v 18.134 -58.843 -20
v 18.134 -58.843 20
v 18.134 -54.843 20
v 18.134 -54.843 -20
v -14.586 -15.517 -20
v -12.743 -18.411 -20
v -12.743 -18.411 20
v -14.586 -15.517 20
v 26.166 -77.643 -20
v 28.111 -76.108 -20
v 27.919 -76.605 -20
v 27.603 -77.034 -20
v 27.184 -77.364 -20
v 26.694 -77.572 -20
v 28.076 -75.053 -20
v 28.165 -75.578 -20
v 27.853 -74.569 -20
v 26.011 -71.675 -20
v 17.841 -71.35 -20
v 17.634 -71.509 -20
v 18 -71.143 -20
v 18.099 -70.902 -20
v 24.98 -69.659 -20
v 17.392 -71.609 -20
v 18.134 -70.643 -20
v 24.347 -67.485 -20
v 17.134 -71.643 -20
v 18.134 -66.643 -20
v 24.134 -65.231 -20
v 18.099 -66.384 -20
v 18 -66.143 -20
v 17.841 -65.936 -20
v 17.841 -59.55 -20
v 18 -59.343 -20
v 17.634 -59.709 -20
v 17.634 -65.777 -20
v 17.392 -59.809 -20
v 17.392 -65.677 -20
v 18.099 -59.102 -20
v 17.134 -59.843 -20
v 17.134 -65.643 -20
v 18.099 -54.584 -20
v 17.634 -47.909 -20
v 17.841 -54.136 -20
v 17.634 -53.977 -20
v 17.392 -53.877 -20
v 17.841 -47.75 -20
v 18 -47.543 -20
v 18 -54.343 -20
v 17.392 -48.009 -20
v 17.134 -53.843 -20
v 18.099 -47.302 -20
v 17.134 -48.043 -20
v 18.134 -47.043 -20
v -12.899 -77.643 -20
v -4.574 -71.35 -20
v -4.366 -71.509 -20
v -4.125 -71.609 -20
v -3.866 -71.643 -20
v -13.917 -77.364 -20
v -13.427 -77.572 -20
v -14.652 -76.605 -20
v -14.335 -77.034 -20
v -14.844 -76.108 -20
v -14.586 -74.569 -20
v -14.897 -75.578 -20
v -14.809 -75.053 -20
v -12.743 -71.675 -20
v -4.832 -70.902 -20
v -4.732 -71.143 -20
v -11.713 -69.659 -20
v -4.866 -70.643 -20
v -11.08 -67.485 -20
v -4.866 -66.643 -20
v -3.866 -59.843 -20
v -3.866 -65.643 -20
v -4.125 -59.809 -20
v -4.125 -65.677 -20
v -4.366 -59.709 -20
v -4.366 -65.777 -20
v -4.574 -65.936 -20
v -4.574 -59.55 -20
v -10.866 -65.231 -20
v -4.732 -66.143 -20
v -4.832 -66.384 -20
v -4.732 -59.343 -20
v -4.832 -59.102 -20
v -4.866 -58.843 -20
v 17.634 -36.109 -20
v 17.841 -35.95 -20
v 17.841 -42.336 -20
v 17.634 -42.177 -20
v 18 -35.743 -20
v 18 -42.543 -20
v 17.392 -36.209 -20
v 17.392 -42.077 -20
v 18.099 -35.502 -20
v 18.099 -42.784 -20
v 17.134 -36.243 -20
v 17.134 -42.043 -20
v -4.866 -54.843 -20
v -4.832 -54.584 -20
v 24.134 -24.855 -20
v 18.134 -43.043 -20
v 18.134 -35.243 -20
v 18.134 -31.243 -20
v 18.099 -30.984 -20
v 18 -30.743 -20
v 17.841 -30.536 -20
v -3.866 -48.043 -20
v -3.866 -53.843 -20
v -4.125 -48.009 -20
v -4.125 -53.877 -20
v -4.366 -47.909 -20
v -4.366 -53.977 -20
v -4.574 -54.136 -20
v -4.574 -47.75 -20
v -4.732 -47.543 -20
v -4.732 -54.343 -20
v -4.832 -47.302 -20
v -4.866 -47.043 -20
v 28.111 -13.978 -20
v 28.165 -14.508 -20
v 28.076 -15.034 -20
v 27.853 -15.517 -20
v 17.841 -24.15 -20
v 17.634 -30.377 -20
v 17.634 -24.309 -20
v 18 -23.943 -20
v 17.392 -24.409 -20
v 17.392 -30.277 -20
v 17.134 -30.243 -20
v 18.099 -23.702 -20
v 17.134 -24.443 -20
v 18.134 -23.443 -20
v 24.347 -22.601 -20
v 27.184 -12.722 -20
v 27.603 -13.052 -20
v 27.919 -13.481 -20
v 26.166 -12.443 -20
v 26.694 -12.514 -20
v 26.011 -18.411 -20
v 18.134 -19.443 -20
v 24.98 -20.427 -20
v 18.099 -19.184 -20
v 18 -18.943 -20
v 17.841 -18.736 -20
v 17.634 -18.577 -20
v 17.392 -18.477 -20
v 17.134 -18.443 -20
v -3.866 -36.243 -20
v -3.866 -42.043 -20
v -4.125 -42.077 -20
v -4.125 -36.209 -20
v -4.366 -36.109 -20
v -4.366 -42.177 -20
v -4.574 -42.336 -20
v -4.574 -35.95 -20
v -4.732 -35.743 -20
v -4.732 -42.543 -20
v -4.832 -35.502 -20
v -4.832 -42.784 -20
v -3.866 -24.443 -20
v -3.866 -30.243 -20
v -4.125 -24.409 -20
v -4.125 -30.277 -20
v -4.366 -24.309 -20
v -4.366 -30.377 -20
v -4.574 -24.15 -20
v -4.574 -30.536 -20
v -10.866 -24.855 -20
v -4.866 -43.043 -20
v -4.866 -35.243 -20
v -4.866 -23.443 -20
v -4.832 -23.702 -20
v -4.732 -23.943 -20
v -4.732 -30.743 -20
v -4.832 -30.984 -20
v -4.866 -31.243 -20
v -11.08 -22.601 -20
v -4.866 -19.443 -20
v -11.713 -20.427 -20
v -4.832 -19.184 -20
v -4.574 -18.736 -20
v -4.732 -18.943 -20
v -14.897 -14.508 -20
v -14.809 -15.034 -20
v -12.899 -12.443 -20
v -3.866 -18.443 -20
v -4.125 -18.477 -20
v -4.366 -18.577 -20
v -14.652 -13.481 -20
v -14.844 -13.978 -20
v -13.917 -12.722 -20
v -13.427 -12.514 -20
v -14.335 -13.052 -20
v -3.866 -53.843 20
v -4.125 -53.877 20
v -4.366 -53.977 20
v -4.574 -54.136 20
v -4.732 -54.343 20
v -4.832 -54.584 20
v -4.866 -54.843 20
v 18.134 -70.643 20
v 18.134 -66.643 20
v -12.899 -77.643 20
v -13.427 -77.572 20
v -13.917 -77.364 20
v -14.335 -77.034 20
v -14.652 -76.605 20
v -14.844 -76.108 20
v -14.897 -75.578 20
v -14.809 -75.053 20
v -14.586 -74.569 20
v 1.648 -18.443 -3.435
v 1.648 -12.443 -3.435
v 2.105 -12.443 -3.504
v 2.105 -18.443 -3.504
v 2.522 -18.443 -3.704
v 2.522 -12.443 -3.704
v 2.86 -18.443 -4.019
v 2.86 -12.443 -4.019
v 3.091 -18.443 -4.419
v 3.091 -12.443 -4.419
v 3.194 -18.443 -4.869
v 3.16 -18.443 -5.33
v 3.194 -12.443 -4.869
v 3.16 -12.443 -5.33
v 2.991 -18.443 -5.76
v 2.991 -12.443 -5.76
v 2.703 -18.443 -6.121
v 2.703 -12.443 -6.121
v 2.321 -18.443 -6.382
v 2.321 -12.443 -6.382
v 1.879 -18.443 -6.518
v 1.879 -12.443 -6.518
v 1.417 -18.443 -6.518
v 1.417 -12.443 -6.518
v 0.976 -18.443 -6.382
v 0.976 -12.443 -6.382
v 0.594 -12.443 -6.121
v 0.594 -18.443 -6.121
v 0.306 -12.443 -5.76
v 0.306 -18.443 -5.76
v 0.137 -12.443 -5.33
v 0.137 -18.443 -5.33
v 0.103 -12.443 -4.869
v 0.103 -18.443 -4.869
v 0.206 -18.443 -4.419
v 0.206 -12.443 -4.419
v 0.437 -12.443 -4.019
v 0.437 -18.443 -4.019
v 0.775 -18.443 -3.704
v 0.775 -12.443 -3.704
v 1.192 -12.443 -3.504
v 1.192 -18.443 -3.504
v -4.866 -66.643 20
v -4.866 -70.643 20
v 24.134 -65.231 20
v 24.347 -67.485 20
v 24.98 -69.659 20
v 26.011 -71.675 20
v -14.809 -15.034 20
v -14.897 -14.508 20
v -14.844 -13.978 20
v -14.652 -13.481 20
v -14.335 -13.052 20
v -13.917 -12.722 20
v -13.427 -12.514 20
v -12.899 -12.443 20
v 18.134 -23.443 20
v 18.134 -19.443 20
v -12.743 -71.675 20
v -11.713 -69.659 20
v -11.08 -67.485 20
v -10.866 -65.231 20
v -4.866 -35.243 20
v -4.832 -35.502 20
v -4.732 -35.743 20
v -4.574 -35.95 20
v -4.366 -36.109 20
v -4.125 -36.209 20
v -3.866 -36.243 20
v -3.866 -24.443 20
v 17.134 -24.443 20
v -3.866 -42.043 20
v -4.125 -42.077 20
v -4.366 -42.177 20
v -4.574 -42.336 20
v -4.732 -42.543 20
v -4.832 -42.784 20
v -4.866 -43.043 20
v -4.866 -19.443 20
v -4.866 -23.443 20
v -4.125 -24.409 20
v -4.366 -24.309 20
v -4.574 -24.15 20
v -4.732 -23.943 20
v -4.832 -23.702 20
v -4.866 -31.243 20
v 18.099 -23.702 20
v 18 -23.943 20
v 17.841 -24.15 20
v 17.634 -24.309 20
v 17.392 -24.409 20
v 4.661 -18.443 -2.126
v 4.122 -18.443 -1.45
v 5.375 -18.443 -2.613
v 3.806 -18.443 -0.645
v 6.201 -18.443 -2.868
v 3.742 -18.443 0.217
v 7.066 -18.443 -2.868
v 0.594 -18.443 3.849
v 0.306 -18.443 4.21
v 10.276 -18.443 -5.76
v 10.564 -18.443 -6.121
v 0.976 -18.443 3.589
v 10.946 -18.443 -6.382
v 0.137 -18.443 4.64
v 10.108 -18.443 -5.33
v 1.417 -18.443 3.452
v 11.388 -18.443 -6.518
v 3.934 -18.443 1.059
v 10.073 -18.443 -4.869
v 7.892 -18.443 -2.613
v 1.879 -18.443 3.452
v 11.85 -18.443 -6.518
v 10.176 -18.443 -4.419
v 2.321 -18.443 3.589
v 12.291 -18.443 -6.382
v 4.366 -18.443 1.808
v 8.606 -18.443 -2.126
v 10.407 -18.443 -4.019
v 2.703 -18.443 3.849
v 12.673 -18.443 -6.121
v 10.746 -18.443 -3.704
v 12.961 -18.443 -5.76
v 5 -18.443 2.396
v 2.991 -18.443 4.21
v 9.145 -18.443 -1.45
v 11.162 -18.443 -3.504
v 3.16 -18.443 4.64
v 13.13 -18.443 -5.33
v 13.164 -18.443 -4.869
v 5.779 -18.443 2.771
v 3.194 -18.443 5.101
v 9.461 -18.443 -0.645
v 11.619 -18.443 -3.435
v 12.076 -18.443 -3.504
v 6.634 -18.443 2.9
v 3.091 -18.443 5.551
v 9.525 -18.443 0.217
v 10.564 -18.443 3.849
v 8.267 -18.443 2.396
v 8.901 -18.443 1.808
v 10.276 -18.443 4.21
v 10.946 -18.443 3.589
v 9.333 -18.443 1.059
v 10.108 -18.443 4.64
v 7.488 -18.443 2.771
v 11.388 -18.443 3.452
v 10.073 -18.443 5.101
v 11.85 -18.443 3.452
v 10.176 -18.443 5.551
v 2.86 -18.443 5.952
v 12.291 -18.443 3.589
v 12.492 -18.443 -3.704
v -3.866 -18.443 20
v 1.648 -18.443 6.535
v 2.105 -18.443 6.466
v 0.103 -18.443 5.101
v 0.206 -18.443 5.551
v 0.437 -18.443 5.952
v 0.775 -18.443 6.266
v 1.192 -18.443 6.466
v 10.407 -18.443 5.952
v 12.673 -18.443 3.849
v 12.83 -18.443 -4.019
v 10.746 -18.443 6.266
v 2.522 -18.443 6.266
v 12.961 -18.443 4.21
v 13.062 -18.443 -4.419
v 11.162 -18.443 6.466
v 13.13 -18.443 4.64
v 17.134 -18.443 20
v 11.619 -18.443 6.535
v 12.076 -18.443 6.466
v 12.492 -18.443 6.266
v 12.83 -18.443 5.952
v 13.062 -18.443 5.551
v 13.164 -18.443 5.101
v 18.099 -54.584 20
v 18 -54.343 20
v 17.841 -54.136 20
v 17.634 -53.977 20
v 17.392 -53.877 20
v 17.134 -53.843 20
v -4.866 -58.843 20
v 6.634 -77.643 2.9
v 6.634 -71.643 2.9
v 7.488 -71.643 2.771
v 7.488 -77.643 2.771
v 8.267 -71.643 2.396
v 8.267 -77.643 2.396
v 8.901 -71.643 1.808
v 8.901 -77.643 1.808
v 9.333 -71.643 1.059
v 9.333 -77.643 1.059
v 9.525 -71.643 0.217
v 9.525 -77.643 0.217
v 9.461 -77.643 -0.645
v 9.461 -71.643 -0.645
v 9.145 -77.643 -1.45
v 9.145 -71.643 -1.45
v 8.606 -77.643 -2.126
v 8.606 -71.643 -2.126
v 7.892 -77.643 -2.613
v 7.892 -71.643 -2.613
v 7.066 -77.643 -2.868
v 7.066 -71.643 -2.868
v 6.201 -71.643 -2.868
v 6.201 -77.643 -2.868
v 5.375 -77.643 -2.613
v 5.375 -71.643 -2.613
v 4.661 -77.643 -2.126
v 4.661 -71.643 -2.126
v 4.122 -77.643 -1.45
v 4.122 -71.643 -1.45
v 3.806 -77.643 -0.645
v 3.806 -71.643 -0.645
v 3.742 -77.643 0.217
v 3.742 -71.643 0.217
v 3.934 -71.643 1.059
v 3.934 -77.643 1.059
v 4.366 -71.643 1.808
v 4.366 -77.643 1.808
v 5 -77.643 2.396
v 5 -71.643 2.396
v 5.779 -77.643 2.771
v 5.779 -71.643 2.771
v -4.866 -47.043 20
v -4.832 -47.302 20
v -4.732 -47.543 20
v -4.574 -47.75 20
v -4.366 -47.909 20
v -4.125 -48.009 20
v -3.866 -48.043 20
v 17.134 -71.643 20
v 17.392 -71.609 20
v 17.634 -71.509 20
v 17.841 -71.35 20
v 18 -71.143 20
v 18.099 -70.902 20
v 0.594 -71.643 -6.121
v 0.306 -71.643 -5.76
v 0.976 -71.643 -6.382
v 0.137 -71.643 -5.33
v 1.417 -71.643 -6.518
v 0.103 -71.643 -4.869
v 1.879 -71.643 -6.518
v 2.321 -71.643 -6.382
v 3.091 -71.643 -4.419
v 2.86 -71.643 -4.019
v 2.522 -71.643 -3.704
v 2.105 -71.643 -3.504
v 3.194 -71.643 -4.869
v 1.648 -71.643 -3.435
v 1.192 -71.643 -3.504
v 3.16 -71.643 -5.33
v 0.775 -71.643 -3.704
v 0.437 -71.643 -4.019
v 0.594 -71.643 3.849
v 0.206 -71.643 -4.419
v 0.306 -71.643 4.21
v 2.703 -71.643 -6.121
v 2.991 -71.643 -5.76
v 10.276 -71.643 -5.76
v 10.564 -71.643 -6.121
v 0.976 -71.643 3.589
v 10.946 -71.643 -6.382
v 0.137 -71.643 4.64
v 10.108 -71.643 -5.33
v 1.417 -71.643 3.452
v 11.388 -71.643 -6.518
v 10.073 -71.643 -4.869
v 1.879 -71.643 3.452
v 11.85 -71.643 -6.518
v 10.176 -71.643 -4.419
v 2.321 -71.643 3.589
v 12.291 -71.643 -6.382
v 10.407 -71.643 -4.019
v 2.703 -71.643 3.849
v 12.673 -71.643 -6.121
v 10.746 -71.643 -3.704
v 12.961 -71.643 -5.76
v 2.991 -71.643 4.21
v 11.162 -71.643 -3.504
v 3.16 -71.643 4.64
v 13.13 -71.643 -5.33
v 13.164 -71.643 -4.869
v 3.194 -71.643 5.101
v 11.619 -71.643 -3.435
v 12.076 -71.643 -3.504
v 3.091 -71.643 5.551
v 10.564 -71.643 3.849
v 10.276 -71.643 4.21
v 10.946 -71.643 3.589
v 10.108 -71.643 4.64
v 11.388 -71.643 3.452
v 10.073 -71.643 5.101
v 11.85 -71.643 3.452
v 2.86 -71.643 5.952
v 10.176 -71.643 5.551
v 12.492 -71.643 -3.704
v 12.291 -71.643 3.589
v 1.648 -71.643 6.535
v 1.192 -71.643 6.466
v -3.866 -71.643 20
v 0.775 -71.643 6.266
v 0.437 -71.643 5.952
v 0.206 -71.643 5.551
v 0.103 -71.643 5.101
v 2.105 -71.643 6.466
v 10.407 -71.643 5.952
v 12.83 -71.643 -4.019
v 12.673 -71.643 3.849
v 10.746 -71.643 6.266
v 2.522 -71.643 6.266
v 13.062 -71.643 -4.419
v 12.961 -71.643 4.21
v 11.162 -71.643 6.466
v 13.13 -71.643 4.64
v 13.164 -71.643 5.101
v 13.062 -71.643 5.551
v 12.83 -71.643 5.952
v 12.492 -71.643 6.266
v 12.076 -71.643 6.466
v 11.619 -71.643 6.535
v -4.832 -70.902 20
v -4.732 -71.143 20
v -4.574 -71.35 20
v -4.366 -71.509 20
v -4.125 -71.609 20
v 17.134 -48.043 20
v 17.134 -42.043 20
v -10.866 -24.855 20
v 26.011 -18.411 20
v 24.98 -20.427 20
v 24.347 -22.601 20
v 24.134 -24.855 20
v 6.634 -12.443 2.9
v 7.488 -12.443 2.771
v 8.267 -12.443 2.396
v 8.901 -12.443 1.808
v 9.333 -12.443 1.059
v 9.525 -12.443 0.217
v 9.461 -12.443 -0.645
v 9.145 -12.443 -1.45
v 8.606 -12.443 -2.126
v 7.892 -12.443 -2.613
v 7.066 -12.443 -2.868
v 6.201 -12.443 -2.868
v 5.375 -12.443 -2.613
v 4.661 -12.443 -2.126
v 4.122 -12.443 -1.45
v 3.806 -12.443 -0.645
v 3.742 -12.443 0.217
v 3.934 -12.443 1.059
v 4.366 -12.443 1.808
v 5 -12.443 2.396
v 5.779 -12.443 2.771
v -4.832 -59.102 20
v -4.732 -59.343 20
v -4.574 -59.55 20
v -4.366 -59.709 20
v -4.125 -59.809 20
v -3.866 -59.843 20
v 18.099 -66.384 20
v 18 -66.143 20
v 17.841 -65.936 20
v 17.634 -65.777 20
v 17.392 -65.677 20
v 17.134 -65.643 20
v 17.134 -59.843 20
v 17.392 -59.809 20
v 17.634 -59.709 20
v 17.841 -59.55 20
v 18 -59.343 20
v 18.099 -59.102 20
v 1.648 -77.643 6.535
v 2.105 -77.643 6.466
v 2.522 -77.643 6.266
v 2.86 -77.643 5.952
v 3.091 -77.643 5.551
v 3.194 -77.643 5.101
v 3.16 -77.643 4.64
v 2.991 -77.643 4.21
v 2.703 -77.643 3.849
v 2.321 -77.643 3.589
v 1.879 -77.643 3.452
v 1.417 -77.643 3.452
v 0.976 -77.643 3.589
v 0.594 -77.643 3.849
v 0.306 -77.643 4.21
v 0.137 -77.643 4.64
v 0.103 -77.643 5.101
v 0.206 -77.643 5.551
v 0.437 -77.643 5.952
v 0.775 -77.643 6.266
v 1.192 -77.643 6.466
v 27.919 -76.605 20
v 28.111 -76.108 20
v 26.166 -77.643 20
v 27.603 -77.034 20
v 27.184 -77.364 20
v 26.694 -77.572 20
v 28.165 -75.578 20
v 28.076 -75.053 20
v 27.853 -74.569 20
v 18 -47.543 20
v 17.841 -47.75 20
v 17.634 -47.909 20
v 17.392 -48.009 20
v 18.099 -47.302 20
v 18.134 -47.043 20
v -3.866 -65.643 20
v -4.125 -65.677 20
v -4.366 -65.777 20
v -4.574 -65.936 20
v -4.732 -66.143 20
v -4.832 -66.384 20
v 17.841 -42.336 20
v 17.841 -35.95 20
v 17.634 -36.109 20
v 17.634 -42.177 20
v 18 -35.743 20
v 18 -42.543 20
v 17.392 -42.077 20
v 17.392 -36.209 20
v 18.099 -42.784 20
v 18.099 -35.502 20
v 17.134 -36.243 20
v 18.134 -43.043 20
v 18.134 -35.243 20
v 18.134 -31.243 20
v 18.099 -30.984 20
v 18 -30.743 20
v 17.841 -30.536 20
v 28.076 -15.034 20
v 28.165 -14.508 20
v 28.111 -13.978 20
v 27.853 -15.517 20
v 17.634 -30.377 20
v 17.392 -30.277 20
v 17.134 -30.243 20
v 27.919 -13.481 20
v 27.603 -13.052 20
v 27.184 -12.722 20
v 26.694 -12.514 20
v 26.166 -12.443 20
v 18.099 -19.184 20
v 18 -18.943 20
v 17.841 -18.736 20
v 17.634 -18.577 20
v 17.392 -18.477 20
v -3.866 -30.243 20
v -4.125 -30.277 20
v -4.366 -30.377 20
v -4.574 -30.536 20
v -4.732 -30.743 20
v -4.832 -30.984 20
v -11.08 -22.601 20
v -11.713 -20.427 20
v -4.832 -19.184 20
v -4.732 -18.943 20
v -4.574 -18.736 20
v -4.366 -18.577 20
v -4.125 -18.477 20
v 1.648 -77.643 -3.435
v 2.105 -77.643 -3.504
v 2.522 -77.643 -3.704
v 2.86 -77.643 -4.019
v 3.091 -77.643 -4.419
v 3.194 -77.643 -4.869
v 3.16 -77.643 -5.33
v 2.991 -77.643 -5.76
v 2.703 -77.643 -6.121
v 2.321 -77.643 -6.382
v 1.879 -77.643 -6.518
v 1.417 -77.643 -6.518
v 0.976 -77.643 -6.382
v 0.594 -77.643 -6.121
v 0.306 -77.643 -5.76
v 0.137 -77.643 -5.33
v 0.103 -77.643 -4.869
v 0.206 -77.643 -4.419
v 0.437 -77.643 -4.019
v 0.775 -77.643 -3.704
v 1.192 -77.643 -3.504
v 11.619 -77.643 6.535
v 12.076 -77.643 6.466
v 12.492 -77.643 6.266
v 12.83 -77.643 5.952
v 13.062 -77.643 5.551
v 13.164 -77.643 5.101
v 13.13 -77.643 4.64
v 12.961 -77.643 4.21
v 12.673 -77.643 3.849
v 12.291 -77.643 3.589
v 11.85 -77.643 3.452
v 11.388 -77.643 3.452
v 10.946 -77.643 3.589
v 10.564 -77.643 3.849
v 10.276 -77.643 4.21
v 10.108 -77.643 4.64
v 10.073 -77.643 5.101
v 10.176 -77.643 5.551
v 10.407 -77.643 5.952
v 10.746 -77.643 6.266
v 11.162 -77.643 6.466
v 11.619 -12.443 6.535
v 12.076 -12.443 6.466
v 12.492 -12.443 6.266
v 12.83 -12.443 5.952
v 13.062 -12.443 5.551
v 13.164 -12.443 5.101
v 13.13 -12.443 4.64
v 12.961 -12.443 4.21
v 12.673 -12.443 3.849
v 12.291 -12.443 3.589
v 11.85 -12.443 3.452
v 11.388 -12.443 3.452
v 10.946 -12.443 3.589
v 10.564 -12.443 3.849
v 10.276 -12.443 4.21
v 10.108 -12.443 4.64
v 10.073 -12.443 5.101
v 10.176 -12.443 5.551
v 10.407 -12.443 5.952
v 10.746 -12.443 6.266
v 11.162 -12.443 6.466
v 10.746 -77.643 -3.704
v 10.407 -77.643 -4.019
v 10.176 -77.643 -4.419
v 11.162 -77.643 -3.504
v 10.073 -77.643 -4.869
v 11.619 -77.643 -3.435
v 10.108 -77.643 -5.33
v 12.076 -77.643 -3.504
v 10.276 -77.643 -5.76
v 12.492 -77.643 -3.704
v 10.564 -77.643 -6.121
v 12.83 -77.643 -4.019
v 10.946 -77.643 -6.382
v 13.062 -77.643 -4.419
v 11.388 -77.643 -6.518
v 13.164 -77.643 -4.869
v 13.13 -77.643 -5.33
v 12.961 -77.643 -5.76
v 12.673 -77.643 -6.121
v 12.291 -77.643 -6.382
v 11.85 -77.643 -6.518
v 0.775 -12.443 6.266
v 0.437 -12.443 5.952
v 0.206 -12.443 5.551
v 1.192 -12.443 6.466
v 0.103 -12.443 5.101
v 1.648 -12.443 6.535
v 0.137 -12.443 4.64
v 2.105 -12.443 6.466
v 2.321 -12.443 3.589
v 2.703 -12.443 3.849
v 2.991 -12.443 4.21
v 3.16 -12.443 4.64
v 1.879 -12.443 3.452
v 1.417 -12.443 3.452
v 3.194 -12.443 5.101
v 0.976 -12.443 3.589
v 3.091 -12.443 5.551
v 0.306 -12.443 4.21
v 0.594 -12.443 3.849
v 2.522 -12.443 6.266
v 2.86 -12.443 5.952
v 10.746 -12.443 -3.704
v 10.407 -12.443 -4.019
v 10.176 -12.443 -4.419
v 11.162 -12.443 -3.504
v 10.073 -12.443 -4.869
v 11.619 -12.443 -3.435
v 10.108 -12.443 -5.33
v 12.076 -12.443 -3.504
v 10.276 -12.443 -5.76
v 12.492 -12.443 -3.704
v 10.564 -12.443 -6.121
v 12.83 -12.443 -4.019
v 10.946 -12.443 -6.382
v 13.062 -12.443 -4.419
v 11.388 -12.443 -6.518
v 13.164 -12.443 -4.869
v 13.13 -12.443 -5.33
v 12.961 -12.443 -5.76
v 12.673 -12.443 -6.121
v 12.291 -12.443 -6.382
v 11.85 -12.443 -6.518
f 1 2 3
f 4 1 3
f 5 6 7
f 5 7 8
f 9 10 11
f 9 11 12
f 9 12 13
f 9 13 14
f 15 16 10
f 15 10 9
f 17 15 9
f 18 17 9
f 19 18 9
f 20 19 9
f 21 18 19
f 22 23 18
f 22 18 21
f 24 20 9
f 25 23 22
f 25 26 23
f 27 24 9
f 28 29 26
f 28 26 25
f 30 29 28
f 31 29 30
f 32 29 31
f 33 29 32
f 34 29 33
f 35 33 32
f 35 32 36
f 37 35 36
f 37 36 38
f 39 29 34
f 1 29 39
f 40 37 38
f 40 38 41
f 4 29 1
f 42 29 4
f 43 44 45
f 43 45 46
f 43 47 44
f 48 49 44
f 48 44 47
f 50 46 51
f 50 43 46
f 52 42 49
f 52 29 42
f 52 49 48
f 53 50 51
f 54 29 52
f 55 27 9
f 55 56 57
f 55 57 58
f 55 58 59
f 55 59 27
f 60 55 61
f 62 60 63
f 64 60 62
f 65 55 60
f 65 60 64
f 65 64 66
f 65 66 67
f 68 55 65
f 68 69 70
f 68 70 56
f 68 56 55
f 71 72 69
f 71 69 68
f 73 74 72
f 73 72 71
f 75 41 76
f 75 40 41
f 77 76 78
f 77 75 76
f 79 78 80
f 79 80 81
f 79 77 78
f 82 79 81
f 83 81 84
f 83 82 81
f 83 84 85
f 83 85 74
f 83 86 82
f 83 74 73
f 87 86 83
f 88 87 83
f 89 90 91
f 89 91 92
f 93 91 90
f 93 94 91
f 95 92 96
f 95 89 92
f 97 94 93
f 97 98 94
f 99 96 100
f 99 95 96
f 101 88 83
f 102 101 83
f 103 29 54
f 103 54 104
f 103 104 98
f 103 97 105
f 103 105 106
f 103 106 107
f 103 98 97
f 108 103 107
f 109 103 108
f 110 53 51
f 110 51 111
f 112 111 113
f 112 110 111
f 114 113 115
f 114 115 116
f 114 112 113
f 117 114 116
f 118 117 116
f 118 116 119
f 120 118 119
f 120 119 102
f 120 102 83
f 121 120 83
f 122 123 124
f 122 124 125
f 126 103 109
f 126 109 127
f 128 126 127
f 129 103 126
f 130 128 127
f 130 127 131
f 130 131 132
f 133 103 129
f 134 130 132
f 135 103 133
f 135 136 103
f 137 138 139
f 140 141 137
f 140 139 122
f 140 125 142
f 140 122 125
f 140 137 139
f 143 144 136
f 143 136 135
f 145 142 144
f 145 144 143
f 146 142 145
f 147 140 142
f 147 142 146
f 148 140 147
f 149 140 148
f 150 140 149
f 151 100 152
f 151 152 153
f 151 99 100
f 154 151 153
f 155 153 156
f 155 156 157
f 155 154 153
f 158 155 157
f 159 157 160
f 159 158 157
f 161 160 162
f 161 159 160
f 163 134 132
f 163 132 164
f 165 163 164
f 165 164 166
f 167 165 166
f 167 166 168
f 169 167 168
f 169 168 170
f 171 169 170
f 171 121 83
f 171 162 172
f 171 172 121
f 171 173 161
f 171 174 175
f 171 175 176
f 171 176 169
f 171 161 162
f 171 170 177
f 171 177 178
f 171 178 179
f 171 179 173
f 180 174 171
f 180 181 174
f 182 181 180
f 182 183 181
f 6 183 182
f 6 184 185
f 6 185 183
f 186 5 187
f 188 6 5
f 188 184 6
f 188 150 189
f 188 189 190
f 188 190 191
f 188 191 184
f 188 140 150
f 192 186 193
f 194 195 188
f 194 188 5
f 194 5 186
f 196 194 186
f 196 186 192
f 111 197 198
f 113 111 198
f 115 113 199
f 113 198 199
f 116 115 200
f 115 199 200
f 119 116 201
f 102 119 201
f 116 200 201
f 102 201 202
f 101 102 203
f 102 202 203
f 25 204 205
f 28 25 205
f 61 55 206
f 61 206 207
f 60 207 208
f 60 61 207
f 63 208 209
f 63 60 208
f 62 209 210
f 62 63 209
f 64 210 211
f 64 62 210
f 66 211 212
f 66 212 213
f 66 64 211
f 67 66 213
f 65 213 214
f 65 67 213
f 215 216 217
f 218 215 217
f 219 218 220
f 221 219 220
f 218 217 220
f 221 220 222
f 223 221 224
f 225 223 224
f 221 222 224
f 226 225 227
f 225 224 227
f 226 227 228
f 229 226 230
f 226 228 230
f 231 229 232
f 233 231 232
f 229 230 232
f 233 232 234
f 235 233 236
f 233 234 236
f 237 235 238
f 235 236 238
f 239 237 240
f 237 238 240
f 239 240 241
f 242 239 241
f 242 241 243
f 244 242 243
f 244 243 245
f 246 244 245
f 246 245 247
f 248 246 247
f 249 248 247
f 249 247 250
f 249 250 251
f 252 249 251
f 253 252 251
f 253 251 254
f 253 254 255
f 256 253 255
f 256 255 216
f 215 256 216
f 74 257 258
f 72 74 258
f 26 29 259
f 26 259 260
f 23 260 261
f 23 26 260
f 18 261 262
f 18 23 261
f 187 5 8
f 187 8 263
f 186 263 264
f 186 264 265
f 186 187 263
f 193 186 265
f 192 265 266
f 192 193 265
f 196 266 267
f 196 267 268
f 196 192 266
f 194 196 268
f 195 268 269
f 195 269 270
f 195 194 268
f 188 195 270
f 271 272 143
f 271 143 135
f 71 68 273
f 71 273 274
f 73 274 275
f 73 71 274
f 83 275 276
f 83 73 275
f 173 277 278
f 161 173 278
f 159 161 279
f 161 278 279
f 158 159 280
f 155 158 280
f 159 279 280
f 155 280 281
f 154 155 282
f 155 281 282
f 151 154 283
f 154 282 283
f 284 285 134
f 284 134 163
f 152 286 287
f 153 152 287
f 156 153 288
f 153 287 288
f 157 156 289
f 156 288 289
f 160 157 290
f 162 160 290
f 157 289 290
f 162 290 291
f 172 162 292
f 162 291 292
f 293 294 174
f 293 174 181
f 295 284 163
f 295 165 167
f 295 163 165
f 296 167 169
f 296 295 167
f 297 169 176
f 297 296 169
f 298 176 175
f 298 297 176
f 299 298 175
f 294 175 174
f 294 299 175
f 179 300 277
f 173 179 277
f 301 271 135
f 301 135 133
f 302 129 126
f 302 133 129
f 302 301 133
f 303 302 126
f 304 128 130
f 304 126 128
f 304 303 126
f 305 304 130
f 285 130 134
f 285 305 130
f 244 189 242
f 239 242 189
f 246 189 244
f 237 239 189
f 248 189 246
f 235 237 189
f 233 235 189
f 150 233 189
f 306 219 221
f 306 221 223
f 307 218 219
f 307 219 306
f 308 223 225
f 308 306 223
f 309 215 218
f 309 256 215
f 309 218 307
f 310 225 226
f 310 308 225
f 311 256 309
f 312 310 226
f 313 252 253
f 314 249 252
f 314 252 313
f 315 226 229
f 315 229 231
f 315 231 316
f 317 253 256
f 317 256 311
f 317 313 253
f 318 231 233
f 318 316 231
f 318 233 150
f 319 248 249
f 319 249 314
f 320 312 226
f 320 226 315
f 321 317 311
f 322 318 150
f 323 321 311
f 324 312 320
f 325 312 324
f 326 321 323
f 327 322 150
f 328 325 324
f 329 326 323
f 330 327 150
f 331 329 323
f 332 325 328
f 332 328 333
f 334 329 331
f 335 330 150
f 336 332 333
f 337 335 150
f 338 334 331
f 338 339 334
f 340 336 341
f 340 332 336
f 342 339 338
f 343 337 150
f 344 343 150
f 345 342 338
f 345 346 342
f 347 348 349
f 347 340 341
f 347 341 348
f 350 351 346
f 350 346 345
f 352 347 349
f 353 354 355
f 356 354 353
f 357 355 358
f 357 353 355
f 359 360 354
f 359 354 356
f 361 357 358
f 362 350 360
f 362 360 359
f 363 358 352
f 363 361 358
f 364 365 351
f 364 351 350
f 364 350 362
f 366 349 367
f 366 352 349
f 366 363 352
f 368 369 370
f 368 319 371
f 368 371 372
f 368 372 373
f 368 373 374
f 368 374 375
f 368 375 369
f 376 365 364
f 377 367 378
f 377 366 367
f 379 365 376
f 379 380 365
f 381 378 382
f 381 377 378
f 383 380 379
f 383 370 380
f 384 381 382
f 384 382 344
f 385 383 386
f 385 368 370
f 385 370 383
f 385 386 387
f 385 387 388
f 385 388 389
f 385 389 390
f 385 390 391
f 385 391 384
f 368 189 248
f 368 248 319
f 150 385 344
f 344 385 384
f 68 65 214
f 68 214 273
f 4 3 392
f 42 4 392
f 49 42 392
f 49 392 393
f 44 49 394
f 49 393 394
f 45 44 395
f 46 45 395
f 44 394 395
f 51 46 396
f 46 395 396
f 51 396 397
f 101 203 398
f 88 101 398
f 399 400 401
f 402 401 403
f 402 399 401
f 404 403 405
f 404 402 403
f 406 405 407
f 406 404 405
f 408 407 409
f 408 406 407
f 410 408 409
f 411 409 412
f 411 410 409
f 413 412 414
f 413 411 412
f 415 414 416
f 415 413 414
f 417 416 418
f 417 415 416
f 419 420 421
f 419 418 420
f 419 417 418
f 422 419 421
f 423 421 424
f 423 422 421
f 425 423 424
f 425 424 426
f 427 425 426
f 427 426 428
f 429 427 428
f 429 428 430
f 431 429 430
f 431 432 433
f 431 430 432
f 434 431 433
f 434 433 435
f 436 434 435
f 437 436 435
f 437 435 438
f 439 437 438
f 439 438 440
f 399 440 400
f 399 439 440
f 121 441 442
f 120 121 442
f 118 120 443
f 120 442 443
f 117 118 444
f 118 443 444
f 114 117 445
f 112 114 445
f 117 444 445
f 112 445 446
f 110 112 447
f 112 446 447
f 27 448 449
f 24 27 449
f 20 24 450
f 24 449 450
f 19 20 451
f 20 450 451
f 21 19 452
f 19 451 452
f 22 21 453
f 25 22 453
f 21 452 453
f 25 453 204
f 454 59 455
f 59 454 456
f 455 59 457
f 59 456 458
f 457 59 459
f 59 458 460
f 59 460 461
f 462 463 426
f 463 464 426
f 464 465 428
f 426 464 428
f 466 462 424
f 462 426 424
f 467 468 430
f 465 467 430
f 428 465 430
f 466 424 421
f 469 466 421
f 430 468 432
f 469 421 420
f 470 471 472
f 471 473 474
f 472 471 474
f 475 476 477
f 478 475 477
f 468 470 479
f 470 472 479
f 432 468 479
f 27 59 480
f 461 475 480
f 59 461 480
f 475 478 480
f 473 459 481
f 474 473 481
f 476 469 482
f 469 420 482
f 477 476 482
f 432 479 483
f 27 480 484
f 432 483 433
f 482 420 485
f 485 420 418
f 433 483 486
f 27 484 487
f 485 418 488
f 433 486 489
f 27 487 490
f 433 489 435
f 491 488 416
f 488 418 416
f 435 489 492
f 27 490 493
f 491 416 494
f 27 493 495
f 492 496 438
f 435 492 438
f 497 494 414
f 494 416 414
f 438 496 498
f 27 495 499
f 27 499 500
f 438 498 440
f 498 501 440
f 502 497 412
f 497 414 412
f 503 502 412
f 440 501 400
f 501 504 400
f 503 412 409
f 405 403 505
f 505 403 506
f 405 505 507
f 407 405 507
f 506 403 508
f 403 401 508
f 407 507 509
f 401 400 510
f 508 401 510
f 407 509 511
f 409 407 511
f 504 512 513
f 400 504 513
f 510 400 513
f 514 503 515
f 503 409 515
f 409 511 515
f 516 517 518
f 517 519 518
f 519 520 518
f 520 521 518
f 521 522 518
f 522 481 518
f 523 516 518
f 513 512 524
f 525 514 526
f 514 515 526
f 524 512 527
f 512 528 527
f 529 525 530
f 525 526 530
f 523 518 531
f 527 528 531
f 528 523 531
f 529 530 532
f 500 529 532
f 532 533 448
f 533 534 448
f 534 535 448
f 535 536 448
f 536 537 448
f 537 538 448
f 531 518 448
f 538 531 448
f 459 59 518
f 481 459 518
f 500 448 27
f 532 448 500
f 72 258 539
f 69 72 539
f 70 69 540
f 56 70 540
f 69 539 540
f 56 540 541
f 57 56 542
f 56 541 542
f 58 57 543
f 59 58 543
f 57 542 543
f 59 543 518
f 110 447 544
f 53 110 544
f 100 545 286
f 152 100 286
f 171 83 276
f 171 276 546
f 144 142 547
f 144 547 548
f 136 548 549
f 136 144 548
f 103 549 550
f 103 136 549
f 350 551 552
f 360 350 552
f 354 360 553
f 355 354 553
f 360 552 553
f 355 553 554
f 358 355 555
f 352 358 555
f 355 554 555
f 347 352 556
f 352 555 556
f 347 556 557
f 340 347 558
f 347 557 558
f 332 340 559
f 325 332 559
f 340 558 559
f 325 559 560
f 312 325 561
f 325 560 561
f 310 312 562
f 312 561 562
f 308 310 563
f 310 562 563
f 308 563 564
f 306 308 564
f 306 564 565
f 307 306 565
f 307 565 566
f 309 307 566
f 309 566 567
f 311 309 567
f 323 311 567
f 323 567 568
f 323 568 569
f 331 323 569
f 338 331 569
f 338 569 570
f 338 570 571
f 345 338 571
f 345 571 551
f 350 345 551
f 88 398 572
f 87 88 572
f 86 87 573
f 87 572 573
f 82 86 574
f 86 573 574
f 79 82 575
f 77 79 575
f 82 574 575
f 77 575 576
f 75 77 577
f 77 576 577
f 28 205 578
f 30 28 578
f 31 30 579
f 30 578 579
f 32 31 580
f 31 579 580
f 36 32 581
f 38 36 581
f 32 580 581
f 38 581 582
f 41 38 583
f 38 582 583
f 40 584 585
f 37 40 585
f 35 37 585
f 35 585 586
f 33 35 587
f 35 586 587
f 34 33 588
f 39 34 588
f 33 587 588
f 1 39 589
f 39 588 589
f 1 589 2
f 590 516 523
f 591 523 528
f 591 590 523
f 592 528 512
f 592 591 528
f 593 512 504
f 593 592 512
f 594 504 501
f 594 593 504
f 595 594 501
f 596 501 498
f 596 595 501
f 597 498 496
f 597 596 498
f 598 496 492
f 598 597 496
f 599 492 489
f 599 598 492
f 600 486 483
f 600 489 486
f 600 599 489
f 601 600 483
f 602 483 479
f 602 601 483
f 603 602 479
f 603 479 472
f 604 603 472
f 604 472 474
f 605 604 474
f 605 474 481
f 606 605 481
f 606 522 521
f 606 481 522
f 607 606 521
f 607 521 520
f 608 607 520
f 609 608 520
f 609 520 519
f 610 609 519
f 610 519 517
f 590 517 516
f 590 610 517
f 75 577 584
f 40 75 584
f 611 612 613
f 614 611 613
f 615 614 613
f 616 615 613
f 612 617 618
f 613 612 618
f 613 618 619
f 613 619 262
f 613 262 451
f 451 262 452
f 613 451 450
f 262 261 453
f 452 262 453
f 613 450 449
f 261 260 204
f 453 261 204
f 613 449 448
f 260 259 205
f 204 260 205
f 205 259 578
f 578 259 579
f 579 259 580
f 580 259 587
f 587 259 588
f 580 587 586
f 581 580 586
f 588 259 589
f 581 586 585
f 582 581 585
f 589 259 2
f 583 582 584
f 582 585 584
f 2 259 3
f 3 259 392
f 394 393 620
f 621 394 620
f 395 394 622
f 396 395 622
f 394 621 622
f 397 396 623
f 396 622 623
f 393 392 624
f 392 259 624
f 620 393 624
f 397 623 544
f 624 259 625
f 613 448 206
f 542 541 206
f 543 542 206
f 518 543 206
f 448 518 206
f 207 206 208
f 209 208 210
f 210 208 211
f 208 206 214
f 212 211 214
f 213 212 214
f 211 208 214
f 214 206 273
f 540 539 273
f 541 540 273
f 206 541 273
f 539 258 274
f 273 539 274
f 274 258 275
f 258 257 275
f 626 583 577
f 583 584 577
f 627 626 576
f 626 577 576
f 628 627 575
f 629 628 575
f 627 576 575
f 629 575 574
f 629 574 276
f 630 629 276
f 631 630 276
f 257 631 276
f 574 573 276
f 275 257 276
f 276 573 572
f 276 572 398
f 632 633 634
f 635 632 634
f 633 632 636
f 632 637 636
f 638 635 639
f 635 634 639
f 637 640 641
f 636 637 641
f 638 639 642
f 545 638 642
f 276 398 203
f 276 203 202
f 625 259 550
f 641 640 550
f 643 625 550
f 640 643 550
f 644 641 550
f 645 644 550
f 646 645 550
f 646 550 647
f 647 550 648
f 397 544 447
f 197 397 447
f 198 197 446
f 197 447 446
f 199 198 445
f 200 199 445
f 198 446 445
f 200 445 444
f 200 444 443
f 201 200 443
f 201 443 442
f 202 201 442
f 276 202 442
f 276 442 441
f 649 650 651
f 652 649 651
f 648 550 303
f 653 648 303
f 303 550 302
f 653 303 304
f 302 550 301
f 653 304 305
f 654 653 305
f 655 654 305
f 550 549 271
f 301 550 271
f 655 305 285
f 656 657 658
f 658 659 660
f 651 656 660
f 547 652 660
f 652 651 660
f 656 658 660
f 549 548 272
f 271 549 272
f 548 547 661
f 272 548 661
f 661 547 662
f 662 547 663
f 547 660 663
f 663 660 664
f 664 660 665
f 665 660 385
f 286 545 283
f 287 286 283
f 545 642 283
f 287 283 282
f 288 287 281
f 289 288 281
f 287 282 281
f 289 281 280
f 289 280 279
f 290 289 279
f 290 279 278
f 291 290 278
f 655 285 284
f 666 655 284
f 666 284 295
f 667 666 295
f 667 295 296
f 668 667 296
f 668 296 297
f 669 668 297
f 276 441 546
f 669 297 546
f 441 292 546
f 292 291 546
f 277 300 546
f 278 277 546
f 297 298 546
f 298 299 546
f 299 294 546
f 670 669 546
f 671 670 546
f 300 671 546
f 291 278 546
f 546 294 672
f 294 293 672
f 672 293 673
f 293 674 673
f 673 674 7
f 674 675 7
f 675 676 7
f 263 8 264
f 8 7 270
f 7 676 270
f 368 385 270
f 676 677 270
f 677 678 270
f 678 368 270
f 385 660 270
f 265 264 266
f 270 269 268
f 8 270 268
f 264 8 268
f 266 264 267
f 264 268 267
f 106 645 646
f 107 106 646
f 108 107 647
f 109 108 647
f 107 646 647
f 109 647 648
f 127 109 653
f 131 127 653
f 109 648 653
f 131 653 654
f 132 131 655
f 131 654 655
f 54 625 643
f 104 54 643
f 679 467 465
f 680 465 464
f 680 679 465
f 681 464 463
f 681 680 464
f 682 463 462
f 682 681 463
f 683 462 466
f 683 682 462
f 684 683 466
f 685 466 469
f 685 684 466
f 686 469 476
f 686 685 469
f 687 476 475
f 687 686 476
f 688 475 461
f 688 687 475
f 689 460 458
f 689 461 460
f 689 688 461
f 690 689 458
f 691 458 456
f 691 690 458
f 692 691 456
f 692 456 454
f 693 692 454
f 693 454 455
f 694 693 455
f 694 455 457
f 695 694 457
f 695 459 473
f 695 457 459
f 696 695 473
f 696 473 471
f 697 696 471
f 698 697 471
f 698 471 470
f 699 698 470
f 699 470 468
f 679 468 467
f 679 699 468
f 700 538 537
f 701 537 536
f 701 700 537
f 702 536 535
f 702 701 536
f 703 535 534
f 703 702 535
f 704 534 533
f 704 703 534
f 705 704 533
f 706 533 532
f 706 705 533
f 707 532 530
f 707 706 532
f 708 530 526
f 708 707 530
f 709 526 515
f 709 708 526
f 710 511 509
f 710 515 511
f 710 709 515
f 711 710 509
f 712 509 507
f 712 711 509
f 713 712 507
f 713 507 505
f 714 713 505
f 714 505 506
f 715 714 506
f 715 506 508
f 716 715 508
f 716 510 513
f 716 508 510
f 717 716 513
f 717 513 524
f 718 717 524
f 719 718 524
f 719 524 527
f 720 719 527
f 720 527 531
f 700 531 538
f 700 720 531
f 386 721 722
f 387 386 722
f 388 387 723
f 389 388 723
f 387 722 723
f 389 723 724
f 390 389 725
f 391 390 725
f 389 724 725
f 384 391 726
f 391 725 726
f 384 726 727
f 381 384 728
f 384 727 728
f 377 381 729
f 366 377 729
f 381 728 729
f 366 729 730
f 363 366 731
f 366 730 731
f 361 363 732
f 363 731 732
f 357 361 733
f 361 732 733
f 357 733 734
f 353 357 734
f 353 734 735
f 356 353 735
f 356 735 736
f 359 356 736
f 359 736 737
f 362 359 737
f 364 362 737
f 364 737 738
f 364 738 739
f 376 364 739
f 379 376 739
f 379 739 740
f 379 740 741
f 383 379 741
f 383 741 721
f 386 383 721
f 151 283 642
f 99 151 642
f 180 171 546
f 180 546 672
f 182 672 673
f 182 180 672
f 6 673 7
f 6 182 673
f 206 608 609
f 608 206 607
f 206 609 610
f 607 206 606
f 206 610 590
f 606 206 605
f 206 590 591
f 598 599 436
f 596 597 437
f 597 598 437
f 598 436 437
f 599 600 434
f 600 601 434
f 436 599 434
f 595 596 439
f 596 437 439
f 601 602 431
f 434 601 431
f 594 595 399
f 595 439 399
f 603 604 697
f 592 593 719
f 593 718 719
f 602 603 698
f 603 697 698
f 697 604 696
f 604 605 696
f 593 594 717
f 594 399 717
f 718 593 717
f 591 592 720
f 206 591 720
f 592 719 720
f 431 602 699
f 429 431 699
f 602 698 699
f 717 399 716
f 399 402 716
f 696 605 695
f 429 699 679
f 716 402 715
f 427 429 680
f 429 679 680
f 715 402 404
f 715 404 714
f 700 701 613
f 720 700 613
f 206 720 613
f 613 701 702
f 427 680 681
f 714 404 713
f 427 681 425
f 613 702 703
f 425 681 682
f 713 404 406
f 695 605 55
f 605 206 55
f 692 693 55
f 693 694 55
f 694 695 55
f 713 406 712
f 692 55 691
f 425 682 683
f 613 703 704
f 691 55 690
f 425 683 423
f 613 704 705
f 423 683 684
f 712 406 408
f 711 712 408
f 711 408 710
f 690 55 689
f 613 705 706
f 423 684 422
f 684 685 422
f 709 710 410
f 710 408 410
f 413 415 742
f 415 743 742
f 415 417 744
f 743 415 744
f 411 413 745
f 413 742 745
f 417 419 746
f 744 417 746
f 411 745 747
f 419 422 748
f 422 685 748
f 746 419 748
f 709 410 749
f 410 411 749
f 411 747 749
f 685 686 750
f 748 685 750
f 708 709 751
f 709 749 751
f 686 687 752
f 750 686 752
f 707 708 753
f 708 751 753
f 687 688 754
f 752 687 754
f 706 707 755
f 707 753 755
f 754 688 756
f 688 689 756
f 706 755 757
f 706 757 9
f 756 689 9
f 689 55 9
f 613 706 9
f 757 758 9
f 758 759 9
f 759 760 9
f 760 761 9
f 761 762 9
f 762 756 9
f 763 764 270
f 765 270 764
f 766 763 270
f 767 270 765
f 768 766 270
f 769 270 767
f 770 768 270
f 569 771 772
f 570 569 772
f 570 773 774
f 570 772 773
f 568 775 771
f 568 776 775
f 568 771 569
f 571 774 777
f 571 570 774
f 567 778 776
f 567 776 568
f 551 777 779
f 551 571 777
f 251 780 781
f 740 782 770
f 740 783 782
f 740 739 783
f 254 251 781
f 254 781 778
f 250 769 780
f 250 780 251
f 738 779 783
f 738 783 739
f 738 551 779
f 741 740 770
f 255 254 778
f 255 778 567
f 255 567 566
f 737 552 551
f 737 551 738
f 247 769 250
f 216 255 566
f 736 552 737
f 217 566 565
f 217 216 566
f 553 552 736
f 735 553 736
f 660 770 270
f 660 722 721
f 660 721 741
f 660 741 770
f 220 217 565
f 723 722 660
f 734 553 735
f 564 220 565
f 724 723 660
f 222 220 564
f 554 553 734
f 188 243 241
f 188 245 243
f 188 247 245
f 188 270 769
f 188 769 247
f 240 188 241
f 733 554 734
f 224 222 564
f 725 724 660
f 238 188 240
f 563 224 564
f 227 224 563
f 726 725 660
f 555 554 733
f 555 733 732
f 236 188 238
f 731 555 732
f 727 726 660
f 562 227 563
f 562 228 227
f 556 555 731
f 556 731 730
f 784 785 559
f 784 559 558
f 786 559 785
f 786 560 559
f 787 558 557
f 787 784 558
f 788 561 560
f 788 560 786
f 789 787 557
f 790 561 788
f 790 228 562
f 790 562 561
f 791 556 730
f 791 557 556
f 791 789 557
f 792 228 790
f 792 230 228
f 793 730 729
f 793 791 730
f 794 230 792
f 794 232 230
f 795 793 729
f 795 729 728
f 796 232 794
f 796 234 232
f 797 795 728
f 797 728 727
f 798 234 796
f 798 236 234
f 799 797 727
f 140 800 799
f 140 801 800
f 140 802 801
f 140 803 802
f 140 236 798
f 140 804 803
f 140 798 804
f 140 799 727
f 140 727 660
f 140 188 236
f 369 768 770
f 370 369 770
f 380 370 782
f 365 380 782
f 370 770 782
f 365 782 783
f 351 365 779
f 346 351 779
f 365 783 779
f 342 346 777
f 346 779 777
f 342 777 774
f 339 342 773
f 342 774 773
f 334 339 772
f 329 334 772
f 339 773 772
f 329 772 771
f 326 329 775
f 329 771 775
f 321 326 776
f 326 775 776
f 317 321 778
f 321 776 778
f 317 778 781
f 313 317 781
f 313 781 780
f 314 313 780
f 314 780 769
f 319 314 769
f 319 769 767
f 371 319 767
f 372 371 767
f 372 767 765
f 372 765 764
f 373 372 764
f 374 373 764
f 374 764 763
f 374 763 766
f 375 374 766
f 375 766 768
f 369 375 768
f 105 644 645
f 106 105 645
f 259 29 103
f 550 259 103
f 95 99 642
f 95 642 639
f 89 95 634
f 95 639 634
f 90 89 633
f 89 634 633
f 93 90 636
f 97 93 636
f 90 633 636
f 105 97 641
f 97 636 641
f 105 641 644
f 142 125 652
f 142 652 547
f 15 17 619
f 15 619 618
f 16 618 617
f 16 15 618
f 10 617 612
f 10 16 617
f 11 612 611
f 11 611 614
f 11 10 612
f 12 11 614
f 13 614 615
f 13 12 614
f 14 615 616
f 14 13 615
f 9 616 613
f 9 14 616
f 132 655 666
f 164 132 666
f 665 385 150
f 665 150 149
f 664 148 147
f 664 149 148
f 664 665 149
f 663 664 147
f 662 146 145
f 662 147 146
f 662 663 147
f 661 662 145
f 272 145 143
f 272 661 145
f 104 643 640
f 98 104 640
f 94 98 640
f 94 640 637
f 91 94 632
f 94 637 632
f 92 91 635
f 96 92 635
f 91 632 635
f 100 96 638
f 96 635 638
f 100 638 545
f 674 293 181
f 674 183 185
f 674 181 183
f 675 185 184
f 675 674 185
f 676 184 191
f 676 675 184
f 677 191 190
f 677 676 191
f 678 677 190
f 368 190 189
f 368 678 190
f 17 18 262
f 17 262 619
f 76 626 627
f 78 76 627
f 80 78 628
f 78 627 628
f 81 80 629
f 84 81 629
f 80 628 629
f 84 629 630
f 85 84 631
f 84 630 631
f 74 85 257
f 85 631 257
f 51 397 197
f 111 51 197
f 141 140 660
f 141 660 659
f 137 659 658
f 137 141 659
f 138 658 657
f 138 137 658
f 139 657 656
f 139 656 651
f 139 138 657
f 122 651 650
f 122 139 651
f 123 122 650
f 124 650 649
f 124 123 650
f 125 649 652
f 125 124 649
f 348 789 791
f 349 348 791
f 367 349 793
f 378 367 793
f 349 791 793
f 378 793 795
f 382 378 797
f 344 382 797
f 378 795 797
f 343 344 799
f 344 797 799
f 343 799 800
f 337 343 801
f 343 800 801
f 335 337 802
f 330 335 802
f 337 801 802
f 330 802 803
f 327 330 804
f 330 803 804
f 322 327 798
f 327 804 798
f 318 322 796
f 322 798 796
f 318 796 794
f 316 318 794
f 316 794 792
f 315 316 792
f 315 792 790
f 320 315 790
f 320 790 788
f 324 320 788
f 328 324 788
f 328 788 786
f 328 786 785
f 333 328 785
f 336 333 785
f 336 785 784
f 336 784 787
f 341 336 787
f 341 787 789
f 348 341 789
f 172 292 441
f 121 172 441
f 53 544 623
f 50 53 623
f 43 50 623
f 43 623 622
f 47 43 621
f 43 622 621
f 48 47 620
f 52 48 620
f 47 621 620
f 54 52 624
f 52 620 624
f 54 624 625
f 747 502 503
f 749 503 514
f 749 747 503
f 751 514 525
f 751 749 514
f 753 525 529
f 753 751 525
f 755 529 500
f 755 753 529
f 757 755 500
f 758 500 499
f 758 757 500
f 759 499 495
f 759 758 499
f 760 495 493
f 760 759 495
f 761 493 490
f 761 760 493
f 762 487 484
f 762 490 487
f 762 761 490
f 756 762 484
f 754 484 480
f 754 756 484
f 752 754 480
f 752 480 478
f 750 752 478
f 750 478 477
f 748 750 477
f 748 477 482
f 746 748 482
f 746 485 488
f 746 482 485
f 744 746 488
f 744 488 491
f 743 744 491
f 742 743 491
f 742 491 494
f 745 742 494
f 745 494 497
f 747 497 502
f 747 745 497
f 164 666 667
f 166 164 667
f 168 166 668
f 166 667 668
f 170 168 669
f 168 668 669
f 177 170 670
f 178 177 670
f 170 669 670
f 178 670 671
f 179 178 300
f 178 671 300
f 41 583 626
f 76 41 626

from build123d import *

# Parameters (mm, degrees)
BOSS_EXTRUDE1_DEPTH      = 20
BOSS_EXTRUDE1_DEPTH_BACK = 20
SKETCH1_W                = 35
SKETCH1_H                = 65.2
CUT_EXTRUDE3_REACH       = 92.614
SKETCH7_R                = 1.55
SKETCH7_R_2              = 2.9
CUT_EXTRUDE4_DEPTH       = 10
BOSS_EXTRUDE2_DEPTH      = 40


with BuildPart() as part:
    # Sketch1 → Boss-Extrude1 (new, two sides: drawn at the far end of the back side and taken through both)
    with BuildSketch(Plane.XY.offset(-BOSS_EXTRUDE1_DEPTH_BACK)):
        with Locations((6.633557164, -45.043181818)):
            Rectangle(SKETCH1_W, SKETCH1_H)
    extrude(amount=BOSS_EXTRUDE1_DEPTH + BOSS_EXTRUDE1_DEPTH_BACK)

    # Sketch5 → Cut-Extrude3 (cut, up to next)
    with BuildSketch(Plane.XY.offset(20), mode=Mode.PRIVATE) as cut_extrude3_sk1:
        with BuildLine():
            Line((-4.866442836, -31.243181818), (-4.866442836, -35.243181818))
            ThreePointArc((-4.866442836, -35.243181818), (-4.573549617, -35.950288599), (-3.866442836, -36.243181818))
            Line((-3.866442836, -36.243181818), (17.133557164, -36.243181818))
            ThreePointArc((17.133557164, -36.243181818), (17.840663945, -35.950288599), (18.133557164, -35.243181818))
            Line((18.133557164, -35.243181818), (18.133557164, -31.243181818))
            ThreePointArc((18.133557164, -31.243181818), (17.840663945, -30.536075037), (17.133557164, -30.243181818))
            Line((17.133557164, -30.243181818), (-3.866442836, -30.243181818))
            ThreePointArc((-3.866442836, -30.243181818), (-4.573549617, -30.536075037), (-4.866442836, -31.243181818))
        make_face()
    cut_extrude3_tool1 = extrude(cut_extrude3_sk1.sketch, amount=-CUT_EXTRUDE3_REACH, mode=Mode.PRIVATE) & part.part
    # Sketch5 → Cut-Extrude3 (cut, up to next)
    with BuildSketch(Plane.XY.offset(20), mode=Mode.PRIVATE) as cut_extrude3_sk2:
        with BuildLine():
            Line((-4.866442836, -43.043181818), (-4.866442836, -47.043181818))
            ThreePointArc((-4.866442836, -47.043181818), (-4.573549617, -47.750288599), (-3.866442836, -48.043181818))
            Line((-3.866442836, -48.043181818), (17.133557164, -48.043181818))
            ThreePointArc((17.133557164, -48.043181818), (17.840663945, -47.750288599), (18.133557164, -47.043181818))
            Line((18.133557164, -47.043181818), (18.133557164, -43.043181818))
            ThreePointArc((18.133557164, -43.043181818), (17.840663945, -42.336075037), (17.133557164, -42.043181818))
            Line((17.133557164, -42.043181818), (-3.866442836, -42.043181818))
            ThreePointArc((-3.866442836, -42.043181818), (-4.573549617, -42.336075037), (-4.866442836, -43.043181818))
        make_face()
    cut_extrude3_tool2 = extrude(cut_extrude3_sk2.sketch, amount=-CUT_EXTRUDE3_REACH, mode=Mode.PRIVATE) & part.part
    # Sketch5 → Cut-Extrude3 (cut, up to next)
    with BuildSketch(Plane.XY.offset(20), mode=Mode.PRIVATE) as cut_extrude3_sk3:
        with BuildLine():
            Line((-3.866442836, -18.443181818), (17.133557164, -18.443181818))
            ThreePointArc((17.133557164, -18.443181818), (17.840663945, -18.736075037), (18.133557164, -19.443181818))
            Line((18.133557164, -19.443181818), (18.133557164, -23.443181818))
            ThreePointArc((18.133557164, -23.443181818), (17.840663945, -24.150288599), (17.133557164, -24.443181818))
            Line((17.133557164, -24.443181818), (-3.866442836, -24.443181818))
            ThreePointArc((-3.866442836, -24.443181818), (-4.573549617, -24.150288599), (-4.866442836, -23.443181818))
            Line((-4.866442836, -23.443181818), (-4.866442836, -19.443181818))
            ThreePointArc((-4.866442836, -19.443181818), (-4.573549617, -18.736075037), (-3.866442836, -18.443181818))
        make_face()
    cut_extrude3_tool3 = extrude(cut_extrude3_sk3.sketch, amount=-CUT_EXTRUDE3_REACH, mode=Mode.PRIVATE) & part.part
    # Sketch5 → Cut-Extrude3 (cut, up to next)
    with BuildSketch(Plane.XY.offset(20), mode=Mode.PRIVATE) as cut_extrude3_sk4:
        with BuildLine():
            Line((-4.866442836, -54.843181818), (-4.866442836, -58.843181818))
            ThreePointArc((-4.866442836, -58.843181818), (-4.573549617, -59.550288599), (-3.866442836, -59.843181818))
            Line((-3.866442836, -59.843181818), (17.133557164, -59.843181818))
            ThreePointArc((17.133557164, -59.843181818), (17.840663945, -59.550288599), (18.133557164, -58.843181818))
            Line((18.133557164, -58.843181818), (18.133557164, -54.843181818))
            ThreePointArc((18.133557164, -54.843181818), (17.840663945, -54.136075037), (17.133557164, -53.843181818))
            Line((17.133557164, -53.843181818), (-3.866442836, -53.843181818))
            ThreePointArc((-3.866442836, -53.843181818), (-4.573549617, -54.136075037), (-4.866442836, -54.843181818))
        make_face()
    cut_extrude3_tool4 = extrude(cut_extrude3_sk4.sketch, amount=-CUT_EXTRUDE3_REACH, mode=Mode.PRIVATE) & part.part
    # Sketch5 → Cut-Extrude3 (cut, up to next)
    with BuildSketch(Plane.XY.offset(20), mode=Mode.PRIVATE) as cut_extrude3_sk5:
        with BuildLine():
            Line((-4.866442836, -66.643181818), (-4.866442836, -70.643181818))
            ThreePointArc((-4.866442836, -70.643181818), (-4.573549617, -71.350288599), (-3.866442836, -71.643181818))
            Line((-3.866442836, -71.643181818), (17.133557164, -71.643181818))
            ThreePointArc((17.133557164, -71.643181818), (17.840663945, -71.350288599), (18.133557164, -70.643181818))
            Line((18.133557164, -70.643181818), (18.133557164, -66.643181818))
            ThreePointArc((18.133557164, -66.643181818), (17.840663945, -65.936075037), (17.133557164, -65.643181818))
            Line((17.133557164, -65.643181818), (-3.866442836, -65.643181818))
            ThreePointArc((-3.866442836, -65.643181818), (-4.573549617, -65.936075037), (-4.866442836, -66.643181818))
        make_face()
    cut_extrude3_tool5 = extrude(cut_extrude3_sk5.sketch, amount=-CUT_EXTRUDE3_REACH, mode=Mode.PRIVATE) & part.part
    add(cut_extrude3_tool1.solids().sort_by_distance((6.633557, -33.243182, 20))[0], mode=Mode.SUBTRACT)
    add(cut_extrude3_tool2.solids().sort_by_distance((6.633557, -45.043182, 20))[0], mode=Mode.SUBTRACT)
    add(cut_extrude3_tool3.solids().sort_by_distance((6.633557, -21.443182, 20))[0], mode=Mode.SUBTRACT)
    add(cut_extrude3_tool4.solids().sort_by_distance((6.633557, -56.843182, 20))[0], mode=Mode.SUBTRACT)
    add(cut_extrude3_tool5.solids().sort_by_distance((6.633557, -68.643182, 20))[0], mode=Mode.SUBTRACT)

    # Sketch7 → Cut-Extrude4 (cut)
    with BuildSketch(Plane(origin=(0, -12.443181818, 0), x_dir=(1, 0, 0), z_dir=(0, 1, 0))):
        with Locations(Location((1.648454357, 4.985102807, 0), (0, 0, 270))):
            Circle(SKETCH7_R)
        with Locations(Location((6.633557164, 0, 0), (0, 0, 270))):
            Circle(SKETCH7_R_2)
        with Locations(Location((11.618659971, 4.985102807, 0), (0, 0, 270))):
            Circle(SKETCH7_R)
        with Locations(Location((11.618659971, -4.985102807, 0), (0, 0, 270))):
            Circle(SKETCH7_R)
        with Locations(Location((1.648454357, -4.985102807, 0), (0, 0, 270))):
            Circle(SKETCH7_R)
    cut_extrude4 = extrude(amount=-CUT_EXTRUDE4_DEPTH, mode=Mode.SUBTRACT)

    # Mirror5: Cut-Extrude4 across plane
    add(cut_extrude4.mirror(Plane.ZX.offset(-45.043181818)), mode=Mode.SUBTRACT)

    # Sketch9 → Boss-Extrude2 (add)
    with BuildSketch(Plane(origin=(0, 0, -20), x_dir=(-1, 0, 0), z_dir=(0, 0, -1))):
        with BuildLine():
            Line((-24.133557164, -24.855210359), (-24.133557164, -12.443181818))
            Line((-24.133557164, -12.443181818), (-26.165618229, -12.443181818))
            ThreePointArc((-26.165618229, -12.443181818), (-27.91889587, -13.480883782), (-27.852793861, -15.517164307))
            Line((-27.852793861, -15.517164307), (-26.01050337, -18.411315428))
            ThreePointArc((-26.01050337, -18.411315428), (-24.612345302, -21.499368105), (-24.133557164, -24.855210359))
        make_face()
        with BuildLine():
            Line((-24.133557164, -77.643181818), (-24.133557164, -65.231153277))
            ThreePointArc((-24.133557164, -65.231153277), (-24.612345302, -68.586995532), (-26.01050337, -71.675048209))
            Line((-26.01050337, -71.675048209), (-27.852793861, -74.56919933))
            ThreePointArc((-27.852793861, -74.56919933), (-27.91889587, -76.605479855), (-26.165618229, -77.643181818))
            Line((-26.165618229, -77.643181818), (-24.133557164, -77.643181818))
        make_face()
        with BuildLine():
            Line((10.866442836, -65.231153277), (10.866442836, -77.643181818))
            Line((10.866442836, -77.643181818), (12.898503901, -77.643181818))
            ThreePointArc((12.898503901, -77.643181818), (14.651781542, -76.605479855), (14.585679533, -74.56919933))
            Line((14.585679533, -74.56919933), (12.743389042, -71.675048209))
            ThreePointArc((12.743389042, -71.675048209), (11.345230974, -68.586995532), (10.866442836, -65.231153277))
        make_face()
        with BuildLine():
            Line((10.866442836, -12.443181818), (10.866442836, -24.855210359))
            ThreePointArc((10.866442836, -24.855210359), (11.345230974, -21.499368105), (12.743389042, -18.411315428))
            Line((12.743389042, -18.411315428), (14.585679533, -15.517164307))
            ThreePointArc((14.585679533, -15.517164307), (14.651781542, -13.480883782), (12.898503901, -12.443181818))
            Line((12.898503901, -12.443181818), (10.866442836, -12.443181818))
        make_face()
    extrude(amount=-BOSS_EXTRUDE2_DEPTH)


solid = part.part
